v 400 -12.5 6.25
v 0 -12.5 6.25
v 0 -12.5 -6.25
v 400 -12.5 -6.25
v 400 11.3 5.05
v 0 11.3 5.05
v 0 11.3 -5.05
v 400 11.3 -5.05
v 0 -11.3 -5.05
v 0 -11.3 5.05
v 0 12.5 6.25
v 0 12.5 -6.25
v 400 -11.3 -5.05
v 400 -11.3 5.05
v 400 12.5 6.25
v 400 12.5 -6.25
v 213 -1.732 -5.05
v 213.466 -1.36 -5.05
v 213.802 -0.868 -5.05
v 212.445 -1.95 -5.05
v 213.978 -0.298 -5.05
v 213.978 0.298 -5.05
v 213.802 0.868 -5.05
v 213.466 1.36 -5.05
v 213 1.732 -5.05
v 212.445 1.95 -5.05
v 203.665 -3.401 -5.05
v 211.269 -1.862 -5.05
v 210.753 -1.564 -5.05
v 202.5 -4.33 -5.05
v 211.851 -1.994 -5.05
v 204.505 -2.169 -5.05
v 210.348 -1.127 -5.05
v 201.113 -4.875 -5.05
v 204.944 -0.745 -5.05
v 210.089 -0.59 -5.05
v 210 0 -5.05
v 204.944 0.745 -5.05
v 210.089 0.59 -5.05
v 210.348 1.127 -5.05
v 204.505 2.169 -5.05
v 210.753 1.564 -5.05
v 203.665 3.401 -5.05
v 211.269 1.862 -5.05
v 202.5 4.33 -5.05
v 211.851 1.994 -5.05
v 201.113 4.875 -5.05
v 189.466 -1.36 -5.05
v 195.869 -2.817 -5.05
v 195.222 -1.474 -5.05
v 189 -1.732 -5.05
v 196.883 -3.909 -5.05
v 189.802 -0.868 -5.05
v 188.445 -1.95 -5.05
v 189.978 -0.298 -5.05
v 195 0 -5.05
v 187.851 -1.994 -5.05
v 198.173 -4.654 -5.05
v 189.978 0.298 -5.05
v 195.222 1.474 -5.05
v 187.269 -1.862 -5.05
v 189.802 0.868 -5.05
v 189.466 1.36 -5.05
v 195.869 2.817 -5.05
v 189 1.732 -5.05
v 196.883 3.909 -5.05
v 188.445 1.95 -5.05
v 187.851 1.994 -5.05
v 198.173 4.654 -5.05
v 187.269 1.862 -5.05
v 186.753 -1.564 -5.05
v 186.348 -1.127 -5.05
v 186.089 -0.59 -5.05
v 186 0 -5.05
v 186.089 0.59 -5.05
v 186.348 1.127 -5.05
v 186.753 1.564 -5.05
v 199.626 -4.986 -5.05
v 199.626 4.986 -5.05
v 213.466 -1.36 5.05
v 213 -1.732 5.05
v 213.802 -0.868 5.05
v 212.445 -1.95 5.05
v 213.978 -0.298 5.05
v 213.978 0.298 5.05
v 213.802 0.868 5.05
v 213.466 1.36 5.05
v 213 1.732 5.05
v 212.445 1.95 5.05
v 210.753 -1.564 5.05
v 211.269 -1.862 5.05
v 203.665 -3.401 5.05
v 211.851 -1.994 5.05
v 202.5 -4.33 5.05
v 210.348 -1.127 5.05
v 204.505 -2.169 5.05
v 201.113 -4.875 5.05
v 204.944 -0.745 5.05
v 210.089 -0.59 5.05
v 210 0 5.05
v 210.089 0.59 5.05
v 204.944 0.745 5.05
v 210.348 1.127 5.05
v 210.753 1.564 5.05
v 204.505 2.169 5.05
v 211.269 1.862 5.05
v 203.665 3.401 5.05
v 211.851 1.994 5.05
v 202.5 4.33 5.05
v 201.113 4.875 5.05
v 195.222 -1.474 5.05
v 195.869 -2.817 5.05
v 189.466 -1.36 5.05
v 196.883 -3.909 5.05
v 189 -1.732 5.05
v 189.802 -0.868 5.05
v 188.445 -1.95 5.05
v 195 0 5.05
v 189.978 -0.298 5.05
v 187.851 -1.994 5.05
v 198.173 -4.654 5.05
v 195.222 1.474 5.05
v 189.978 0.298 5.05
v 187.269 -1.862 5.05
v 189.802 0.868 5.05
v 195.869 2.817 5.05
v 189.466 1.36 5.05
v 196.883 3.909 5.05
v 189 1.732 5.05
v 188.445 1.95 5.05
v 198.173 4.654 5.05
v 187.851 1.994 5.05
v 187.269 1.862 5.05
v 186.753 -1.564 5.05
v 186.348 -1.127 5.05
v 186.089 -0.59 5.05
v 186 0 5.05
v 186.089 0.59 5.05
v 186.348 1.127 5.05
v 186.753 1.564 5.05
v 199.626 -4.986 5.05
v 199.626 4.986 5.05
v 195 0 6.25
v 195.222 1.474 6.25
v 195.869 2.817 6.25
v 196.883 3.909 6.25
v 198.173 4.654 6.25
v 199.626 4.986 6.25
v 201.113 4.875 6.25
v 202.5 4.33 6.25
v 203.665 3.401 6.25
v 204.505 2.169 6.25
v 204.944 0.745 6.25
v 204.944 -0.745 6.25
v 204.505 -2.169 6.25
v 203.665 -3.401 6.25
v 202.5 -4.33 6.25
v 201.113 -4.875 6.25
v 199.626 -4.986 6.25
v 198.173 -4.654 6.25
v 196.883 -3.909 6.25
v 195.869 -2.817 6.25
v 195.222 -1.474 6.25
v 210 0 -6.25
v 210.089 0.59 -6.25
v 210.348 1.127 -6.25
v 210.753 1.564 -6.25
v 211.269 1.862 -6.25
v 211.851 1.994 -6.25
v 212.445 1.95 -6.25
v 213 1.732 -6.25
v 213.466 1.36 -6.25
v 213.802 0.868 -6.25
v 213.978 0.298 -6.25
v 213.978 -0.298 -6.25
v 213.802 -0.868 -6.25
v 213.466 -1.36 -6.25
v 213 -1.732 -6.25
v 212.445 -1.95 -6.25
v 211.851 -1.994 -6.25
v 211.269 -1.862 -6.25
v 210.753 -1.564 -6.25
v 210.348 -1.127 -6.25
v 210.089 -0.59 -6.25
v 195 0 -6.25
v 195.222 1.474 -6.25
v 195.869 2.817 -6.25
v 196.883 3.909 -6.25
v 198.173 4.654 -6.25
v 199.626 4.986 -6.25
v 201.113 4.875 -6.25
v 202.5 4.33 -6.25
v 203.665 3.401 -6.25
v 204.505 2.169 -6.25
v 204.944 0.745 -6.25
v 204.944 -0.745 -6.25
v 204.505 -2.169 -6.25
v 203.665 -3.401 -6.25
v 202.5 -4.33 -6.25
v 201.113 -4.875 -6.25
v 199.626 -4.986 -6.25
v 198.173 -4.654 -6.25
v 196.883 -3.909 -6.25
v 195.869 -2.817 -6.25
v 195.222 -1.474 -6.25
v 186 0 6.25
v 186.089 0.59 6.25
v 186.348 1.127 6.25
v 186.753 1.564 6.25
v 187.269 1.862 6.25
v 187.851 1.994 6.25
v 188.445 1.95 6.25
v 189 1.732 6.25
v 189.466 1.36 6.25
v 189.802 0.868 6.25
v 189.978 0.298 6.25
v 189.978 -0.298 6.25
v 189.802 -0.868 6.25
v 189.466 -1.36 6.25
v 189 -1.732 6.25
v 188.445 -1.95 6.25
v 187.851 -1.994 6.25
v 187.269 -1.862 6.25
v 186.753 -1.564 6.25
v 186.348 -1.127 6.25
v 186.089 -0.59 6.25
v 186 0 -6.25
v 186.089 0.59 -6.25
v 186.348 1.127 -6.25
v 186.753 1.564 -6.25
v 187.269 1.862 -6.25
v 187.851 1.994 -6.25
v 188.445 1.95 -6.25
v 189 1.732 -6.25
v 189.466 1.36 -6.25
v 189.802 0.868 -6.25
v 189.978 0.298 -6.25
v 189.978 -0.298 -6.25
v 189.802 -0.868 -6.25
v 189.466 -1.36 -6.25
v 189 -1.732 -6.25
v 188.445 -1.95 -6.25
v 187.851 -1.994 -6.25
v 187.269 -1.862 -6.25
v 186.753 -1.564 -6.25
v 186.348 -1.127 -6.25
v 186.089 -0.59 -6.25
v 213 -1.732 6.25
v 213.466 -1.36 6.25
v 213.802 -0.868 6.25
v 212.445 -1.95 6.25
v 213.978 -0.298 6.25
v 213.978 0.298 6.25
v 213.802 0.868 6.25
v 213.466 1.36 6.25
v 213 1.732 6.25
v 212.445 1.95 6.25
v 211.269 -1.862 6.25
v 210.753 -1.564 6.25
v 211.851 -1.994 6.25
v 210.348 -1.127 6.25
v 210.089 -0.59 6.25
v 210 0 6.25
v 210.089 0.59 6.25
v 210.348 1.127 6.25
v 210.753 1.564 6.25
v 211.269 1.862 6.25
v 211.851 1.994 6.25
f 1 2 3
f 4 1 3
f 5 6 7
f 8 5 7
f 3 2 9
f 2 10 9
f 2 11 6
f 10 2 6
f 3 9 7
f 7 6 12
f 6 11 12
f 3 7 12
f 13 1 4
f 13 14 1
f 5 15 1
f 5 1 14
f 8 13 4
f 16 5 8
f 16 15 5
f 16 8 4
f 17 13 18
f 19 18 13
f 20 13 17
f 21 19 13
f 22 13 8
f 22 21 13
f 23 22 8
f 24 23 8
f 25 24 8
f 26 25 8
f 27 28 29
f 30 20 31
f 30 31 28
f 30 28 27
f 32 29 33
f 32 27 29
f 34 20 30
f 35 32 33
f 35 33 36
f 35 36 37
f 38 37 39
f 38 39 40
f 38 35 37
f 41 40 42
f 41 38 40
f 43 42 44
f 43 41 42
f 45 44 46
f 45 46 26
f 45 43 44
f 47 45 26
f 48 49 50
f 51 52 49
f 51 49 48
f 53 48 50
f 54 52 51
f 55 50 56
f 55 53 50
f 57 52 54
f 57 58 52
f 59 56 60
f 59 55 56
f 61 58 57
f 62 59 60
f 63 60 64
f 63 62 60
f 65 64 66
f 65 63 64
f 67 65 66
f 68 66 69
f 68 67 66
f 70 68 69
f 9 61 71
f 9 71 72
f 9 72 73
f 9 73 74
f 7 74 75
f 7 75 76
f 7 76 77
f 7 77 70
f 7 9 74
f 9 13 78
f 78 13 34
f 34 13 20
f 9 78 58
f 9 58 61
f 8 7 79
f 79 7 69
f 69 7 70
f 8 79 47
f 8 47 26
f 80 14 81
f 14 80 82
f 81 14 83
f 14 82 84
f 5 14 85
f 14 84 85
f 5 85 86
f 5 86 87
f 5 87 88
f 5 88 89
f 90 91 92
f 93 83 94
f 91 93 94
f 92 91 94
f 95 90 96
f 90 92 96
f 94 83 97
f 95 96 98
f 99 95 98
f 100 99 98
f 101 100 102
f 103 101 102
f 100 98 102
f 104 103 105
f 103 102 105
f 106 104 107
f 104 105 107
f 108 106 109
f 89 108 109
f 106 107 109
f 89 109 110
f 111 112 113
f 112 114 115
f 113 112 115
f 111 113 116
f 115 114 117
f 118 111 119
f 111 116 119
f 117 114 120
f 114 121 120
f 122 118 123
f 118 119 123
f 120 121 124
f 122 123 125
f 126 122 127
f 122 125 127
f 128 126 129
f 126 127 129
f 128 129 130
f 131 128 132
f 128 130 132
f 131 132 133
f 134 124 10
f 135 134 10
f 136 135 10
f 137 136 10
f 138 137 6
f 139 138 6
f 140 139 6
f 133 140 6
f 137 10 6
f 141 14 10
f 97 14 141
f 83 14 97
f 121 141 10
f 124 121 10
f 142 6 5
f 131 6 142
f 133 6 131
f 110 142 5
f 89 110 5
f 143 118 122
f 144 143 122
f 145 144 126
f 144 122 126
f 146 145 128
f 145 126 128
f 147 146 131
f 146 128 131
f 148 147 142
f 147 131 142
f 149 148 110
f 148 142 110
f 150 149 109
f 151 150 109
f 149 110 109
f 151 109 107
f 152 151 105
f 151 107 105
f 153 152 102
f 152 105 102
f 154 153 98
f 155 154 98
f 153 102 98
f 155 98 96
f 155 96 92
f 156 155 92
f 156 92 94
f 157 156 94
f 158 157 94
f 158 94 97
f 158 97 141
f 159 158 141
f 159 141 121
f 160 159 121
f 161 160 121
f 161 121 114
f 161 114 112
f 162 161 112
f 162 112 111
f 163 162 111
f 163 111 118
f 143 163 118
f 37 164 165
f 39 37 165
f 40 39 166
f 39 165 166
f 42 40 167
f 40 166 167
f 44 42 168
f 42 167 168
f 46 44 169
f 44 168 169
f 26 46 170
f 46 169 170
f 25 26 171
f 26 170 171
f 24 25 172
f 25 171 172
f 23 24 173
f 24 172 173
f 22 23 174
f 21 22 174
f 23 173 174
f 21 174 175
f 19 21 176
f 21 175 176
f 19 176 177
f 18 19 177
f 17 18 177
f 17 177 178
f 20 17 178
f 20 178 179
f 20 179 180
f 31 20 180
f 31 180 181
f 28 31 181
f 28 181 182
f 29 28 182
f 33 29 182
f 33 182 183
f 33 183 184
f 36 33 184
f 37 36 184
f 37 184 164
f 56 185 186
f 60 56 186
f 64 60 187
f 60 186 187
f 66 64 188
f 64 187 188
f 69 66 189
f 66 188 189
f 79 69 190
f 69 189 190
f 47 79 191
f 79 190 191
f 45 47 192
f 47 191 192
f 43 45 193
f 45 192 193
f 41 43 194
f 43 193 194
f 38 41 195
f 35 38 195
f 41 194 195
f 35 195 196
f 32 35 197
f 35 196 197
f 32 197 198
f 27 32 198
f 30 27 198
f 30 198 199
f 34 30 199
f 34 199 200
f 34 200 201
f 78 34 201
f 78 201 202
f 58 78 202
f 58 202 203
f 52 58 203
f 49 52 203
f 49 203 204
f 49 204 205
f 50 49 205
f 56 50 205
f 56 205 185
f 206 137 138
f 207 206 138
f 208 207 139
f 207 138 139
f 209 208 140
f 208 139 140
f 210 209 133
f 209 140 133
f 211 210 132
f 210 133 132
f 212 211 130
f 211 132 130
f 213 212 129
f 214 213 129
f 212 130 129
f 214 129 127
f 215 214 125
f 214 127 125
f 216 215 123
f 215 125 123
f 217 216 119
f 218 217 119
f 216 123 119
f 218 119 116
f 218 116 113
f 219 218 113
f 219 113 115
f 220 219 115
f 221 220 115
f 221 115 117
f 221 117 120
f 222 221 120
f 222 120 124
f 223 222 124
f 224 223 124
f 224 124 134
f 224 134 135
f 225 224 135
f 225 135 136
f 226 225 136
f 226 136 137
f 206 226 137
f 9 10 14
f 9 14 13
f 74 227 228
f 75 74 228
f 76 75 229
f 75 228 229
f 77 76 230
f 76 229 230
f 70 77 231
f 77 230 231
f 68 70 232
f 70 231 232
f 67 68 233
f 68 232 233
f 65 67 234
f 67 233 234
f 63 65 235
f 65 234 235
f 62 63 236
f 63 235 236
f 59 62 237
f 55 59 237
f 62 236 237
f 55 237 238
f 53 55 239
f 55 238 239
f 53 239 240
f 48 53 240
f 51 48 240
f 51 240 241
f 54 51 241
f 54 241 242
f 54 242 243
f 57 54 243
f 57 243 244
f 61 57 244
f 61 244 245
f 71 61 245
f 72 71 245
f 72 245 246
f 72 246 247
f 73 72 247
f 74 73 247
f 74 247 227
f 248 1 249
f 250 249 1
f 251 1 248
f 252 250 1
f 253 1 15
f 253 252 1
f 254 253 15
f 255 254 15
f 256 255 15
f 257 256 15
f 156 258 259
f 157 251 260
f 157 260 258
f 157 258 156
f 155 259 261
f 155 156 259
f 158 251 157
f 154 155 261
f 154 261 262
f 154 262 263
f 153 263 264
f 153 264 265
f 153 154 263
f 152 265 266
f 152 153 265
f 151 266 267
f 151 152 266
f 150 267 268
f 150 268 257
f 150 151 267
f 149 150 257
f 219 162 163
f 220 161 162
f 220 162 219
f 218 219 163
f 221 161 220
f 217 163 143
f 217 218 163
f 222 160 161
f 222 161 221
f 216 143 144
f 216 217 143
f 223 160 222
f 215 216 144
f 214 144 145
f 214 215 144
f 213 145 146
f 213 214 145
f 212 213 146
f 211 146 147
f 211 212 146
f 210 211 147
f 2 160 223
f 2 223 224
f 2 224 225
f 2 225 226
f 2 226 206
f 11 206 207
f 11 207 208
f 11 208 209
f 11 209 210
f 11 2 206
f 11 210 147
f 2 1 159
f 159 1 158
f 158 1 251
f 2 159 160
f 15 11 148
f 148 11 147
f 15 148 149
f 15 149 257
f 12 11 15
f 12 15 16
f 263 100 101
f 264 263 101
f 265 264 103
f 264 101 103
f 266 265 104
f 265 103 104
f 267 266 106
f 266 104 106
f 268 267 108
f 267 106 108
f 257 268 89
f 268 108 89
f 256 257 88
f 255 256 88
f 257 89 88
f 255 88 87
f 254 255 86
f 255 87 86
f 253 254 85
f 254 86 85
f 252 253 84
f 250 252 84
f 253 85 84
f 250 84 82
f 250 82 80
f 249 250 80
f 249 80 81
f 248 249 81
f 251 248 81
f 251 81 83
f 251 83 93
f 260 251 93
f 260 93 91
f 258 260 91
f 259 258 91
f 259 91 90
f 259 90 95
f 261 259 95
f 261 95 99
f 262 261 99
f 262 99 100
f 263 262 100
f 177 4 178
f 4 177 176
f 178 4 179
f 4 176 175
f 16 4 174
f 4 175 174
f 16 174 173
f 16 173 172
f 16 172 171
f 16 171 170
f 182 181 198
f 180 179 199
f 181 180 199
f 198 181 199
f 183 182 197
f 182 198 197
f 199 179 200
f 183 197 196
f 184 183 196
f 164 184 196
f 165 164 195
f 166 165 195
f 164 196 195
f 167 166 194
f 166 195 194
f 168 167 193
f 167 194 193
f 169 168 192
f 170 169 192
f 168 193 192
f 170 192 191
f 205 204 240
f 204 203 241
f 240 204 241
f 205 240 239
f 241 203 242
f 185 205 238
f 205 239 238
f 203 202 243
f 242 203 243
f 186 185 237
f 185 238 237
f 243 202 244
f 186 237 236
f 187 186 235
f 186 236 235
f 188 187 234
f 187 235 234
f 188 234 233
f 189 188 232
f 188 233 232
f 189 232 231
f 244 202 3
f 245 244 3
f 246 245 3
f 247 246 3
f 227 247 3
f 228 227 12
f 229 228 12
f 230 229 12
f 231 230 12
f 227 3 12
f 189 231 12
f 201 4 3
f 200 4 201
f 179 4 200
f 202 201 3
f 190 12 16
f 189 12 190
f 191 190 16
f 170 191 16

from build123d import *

# Parameters (mm, degrees)
SKETCH1_W           = 12.5
SKETCH1_H           = 25
SKETCH1_W_2         = 10.1
SKETCH1_H_2         = 22.6
BOSS_EXTRUDE1_DEPTH = 400
SKETCH3_R           = 5
SKETCH3_R_2         = 2
CUT_EXTRUDE1_DEPTH  = 20


with BuildPart() as part:
    # Sketch1 → Boss-Extrude1 (new body)
    with BuildSketch(Plane(origin=(0, 0, 0), x_dir=(0, 0, -1), z_dir=(1, 0, 0))):
        Rectangle(SKETCH1_W, SKETCH1_H)
        Rectangle(SKETCH1_W_2, SKETCH1_H_2, mode=Mode.SUBTRACT)
    extrude(amount=BOSS_EXTRUDE1_DEPTH)

    # Sketch3 → Cut-Extrude1 (cut)
    with BuildSketch(Plane(origin=(0, 0, -6.25), x_dir=(-1, 0, 0), z_dir=(0, 0, -1))):
        with Locations((-200, 0)):
            Circle(SKETCH3_R)
        with Locations((-188, 0)):
            Circle(SKETCH3_R_2)
        with Locations((-212, 0)):
            Circle(SKETCH3_R_2)
    extrude(amount=-CUT_EXTRUDE1_DEPTH, mode=Mode.SUBTRACT)


solid = part.part
